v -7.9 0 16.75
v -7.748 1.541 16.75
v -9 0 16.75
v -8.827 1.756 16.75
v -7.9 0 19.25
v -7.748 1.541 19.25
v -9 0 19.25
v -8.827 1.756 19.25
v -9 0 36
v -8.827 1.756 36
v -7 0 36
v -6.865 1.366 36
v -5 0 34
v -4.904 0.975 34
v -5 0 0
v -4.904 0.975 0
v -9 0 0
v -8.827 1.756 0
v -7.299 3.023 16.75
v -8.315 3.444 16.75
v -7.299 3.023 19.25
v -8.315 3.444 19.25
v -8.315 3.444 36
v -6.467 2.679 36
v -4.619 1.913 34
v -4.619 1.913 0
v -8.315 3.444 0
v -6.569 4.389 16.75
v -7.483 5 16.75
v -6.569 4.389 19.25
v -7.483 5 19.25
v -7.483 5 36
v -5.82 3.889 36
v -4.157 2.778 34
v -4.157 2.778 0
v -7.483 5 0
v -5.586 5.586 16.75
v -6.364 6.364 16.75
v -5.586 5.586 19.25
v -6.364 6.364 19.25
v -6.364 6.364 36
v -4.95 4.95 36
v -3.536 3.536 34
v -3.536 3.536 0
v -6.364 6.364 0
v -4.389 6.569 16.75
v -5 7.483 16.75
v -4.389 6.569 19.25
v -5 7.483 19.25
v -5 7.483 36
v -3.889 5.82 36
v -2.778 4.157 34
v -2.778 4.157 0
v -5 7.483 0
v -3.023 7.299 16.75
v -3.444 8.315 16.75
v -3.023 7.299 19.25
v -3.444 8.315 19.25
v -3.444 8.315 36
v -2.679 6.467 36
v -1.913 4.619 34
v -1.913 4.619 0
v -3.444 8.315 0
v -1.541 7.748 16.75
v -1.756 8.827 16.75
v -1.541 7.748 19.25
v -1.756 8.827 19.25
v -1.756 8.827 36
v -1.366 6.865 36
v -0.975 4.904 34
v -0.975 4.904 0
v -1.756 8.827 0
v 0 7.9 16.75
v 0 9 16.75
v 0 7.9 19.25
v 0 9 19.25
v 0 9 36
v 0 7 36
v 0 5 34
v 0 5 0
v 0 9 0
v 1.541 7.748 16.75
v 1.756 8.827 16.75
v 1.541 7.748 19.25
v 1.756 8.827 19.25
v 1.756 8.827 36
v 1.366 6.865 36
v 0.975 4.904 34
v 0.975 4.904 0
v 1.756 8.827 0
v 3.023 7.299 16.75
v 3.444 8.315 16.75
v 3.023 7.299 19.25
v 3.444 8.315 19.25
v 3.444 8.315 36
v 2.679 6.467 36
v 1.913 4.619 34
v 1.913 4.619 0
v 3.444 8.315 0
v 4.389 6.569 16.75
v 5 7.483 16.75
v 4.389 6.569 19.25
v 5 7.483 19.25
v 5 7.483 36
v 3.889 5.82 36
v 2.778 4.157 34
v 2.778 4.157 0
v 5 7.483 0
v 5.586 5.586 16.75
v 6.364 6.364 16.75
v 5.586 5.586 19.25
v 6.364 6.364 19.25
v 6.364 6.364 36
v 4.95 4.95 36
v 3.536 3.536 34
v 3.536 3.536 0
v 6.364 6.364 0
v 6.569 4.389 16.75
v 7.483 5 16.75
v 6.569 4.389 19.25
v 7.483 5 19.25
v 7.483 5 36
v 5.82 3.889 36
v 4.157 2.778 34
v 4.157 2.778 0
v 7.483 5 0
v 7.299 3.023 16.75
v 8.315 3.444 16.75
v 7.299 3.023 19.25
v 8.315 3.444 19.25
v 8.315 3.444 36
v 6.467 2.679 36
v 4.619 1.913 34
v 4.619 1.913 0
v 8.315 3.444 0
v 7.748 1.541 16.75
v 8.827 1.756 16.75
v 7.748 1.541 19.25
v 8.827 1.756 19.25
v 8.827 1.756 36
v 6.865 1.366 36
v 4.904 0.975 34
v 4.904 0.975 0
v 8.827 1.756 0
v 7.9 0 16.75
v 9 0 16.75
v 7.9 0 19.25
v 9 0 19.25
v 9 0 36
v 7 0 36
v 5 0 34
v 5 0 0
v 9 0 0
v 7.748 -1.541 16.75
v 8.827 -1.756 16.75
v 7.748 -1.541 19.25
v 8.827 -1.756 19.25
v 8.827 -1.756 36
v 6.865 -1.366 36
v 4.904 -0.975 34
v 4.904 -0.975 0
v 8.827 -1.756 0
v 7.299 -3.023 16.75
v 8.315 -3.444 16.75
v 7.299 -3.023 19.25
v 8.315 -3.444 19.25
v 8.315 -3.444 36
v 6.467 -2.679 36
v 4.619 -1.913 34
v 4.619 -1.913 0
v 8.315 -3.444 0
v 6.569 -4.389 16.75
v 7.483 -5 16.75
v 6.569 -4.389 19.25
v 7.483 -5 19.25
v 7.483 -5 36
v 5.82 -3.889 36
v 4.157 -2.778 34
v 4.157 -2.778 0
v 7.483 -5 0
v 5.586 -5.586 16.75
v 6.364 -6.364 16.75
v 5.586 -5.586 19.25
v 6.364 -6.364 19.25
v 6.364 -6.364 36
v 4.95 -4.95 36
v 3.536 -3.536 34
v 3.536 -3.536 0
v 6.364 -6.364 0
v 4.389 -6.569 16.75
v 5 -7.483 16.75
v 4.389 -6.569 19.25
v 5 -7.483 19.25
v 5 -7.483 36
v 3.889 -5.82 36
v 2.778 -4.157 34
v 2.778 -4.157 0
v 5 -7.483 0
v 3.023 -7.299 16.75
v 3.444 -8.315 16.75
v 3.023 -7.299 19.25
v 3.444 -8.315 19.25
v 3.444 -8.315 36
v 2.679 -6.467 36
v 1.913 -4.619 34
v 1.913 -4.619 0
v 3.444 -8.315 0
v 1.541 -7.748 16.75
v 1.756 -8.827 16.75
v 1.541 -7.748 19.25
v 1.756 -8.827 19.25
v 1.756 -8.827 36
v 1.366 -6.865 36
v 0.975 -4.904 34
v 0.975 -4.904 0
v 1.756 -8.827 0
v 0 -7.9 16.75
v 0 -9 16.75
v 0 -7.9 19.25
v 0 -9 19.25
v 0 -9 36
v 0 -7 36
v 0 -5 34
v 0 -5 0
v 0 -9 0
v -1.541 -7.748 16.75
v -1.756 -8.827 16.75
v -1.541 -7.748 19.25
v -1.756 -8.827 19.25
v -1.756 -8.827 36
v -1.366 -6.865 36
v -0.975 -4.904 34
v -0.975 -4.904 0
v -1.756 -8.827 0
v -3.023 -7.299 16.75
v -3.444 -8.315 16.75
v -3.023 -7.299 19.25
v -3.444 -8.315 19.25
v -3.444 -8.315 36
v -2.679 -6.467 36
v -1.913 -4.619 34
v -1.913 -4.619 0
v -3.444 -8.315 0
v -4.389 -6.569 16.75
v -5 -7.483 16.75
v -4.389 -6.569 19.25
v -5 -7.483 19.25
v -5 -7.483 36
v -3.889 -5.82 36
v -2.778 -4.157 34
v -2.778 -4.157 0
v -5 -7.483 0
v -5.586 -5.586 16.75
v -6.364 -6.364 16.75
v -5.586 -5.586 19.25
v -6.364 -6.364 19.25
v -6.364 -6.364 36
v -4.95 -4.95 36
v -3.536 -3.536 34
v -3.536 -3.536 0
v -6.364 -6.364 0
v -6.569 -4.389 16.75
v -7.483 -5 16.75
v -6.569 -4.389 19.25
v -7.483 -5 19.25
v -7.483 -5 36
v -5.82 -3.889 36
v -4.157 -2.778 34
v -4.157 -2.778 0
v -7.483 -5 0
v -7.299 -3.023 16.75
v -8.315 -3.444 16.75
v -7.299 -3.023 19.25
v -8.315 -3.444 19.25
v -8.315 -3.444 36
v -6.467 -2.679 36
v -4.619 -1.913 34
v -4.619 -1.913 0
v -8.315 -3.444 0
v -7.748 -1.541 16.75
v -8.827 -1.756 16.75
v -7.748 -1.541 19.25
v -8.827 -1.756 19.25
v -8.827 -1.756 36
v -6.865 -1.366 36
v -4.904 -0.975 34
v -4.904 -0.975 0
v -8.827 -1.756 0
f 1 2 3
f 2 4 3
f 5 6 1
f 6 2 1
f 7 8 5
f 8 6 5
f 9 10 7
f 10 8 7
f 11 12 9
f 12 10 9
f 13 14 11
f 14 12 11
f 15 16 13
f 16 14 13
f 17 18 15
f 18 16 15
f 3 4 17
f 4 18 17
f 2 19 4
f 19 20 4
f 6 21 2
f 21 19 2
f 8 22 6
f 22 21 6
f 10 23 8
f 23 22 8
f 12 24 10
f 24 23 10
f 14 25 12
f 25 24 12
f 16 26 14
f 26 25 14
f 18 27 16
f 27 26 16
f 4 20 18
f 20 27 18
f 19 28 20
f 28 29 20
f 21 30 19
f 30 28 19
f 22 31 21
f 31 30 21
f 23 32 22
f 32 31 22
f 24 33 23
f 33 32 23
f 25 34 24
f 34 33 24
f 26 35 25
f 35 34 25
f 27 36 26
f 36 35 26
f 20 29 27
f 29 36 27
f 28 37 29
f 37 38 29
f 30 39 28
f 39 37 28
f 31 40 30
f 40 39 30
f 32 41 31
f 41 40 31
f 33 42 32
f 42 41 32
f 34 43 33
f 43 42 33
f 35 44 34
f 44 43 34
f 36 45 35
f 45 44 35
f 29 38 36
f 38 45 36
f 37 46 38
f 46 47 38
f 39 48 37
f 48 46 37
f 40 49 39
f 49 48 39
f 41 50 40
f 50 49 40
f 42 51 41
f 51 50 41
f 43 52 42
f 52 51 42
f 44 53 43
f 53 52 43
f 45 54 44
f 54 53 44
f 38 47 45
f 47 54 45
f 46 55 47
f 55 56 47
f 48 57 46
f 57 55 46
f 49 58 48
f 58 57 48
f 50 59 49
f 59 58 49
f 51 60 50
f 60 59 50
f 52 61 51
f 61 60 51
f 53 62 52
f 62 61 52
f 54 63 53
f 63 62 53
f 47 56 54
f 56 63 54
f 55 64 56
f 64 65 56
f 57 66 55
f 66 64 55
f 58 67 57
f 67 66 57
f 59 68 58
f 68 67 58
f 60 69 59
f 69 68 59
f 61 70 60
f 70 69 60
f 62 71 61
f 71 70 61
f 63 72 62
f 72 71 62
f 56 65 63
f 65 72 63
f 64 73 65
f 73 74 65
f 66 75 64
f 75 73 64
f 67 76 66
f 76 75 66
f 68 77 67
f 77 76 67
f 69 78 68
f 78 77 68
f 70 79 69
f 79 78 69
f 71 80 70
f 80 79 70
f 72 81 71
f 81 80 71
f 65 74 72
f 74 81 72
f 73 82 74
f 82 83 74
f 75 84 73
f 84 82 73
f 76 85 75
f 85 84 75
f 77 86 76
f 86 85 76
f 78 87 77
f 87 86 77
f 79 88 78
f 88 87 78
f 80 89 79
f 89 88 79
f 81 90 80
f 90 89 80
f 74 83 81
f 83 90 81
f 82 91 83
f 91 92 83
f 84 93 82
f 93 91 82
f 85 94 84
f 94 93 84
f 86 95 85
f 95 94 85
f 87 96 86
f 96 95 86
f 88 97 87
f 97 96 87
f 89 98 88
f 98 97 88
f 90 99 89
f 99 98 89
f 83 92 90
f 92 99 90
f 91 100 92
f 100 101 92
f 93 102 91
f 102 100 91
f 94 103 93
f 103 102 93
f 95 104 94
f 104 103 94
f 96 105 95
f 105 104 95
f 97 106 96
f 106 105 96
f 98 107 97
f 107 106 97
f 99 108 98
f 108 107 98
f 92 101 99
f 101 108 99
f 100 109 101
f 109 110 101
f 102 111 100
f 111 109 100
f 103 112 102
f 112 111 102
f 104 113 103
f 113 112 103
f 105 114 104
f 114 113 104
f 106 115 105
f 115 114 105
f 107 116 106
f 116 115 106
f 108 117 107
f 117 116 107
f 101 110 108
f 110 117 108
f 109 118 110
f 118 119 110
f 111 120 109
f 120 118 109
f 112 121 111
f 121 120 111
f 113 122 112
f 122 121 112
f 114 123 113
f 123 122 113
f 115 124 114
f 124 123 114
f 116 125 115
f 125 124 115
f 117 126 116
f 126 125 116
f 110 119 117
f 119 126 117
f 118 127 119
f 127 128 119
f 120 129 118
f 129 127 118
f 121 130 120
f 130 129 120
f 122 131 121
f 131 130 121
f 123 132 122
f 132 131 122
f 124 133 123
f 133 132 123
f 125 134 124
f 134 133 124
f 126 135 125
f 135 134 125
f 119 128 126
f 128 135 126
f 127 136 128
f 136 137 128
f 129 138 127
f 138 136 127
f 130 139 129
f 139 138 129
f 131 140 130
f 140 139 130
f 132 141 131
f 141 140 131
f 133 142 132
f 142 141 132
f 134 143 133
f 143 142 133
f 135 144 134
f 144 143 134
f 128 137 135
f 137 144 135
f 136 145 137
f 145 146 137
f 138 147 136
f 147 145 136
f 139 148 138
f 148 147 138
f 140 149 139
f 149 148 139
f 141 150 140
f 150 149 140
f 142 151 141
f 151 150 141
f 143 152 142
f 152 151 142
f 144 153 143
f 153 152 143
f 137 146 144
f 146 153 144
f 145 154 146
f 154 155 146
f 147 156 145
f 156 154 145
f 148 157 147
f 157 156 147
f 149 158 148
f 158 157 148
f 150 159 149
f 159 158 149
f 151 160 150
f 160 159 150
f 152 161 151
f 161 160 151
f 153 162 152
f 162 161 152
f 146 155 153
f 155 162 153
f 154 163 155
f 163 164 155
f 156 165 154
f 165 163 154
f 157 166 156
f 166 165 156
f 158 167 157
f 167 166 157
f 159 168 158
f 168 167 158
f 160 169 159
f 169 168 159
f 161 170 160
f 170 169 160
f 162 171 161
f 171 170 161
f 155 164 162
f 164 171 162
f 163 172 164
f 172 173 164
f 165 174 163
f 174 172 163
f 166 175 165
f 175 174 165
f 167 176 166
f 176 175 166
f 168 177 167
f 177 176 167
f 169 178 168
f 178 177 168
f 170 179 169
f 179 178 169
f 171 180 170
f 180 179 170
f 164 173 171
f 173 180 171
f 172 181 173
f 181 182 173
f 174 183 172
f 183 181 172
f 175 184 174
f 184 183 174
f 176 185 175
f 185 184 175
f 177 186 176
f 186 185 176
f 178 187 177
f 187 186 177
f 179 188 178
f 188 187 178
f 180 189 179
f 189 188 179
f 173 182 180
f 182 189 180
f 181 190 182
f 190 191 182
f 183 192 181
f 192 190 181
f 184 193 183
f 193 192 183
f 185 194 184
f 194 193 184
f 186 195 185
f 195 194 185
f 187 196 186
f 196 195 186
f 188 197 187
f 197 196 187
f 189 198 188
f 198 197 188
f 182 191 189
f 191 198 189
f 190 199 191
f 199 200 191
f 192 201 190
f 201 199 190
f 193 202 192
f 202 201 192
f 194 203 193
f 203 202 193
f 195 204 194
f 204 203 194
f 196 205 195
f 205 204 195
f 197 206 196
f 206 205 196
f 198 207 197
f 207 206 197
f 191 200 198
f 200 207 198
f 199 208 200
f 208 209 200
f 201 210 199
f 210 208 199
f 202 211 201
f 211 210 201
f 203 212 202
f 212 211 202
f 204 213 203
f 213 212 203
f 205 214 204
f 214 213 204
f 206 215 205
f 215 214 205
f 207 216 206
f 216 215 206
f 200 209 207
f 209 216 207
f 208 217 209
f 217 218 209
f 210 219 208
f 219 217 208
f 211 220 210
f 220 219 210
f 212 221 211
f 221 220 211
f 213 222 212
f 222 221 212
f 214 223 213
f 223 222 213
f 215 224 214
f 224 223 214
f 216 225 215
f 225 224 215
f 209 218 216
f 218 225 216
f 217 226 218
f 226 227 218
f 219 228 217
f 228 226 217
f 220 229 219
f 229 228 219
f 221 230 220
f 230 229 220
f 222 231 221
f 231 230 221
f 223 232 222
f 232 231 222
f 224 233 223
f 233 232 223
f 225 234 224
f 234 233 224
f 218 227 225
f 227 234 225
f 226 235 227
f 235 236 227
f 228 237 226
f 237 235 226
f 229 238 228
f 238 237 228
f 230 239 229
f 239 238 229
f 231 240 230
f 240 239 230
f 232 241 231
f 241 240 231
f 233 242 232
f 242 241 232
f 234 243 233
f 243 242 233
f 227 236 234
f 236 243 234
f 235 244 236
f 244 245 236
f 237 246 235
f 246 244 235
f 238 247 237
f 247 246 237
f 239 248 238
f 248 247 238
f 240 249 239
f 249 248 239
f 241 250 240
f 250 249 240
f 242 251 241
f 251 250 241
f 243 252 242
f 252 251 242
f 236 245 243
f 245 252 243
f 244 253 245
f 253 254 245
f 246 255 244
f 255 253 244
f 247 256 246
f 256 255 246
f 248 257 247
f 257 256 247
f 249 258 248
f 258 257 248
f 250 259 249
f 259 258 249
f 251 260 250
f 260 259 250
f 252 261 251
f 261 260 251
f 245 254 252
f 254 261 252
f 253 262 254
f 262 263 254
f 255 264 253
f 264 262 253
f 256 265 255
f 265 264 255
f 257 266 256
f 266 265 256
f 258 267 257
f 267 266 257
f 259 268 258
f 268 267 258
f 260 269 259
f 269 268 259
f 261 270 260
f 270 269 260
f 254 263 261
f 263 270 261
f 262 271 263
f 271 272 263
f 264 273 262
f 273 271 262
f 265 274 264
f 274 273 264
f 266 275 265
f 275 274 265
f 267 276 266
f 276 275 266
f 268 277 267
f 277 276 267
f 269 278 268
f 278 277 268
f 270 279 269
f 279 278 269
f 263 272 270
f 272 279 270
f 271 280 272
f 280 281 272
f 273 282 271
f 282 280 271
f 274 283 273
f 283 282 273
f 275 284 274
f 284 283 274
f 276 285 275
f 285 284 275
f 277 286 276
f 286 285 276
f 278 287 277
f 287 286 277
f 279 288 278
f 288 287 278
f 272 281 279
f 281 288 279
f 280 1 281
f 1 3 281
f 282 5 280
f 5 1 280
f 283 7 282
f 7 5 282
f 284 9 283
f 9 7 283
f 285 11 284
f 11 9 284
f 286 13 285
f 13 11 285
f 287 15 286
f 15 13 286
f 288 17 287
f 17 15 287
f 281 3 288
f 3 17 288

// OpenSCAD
$fn = 32;

// ----------------------------------------------------------------------
// Grooved revolve: thread_relief, bore R5
// ----------------------------------------------------------------------

// --- parameters (mm) ---
bore_r = 5;               // bore radius
outer_r = 9;              // outer radius of the body
total_h = 36;             // overall height, Z
wall = 4;                 // radial wall thickness
groove_w = 2.5;           // groove width
groove_d = 1.1;           // groove depth
grooves = 1;              // number of outer grooves
relief = 2;               // thread relief leg at the bore mouth
relief_angle = 45;        // thread relief chamfer angle, degrees

bbox_x = 2 * outer_r;  // full diameter
bore_d = 2 * bore_r;  // bore diameter
body_d = 2 * outer_r;  // body diameter
revolve_angle = 360;  // full turn around the Z axis

profile = [[5, 0], [9, 0], [9, 16.75], [7.9, 16.75], [7.9, 19.25], [9, 19.25], [9, 36], [7, 36], [5, 34]];  // primary outline, 9 points, counter clockwise

// --- the one profile operation ---
rotate_extrude(angle = revolve_angle) polygon(points = profile);
